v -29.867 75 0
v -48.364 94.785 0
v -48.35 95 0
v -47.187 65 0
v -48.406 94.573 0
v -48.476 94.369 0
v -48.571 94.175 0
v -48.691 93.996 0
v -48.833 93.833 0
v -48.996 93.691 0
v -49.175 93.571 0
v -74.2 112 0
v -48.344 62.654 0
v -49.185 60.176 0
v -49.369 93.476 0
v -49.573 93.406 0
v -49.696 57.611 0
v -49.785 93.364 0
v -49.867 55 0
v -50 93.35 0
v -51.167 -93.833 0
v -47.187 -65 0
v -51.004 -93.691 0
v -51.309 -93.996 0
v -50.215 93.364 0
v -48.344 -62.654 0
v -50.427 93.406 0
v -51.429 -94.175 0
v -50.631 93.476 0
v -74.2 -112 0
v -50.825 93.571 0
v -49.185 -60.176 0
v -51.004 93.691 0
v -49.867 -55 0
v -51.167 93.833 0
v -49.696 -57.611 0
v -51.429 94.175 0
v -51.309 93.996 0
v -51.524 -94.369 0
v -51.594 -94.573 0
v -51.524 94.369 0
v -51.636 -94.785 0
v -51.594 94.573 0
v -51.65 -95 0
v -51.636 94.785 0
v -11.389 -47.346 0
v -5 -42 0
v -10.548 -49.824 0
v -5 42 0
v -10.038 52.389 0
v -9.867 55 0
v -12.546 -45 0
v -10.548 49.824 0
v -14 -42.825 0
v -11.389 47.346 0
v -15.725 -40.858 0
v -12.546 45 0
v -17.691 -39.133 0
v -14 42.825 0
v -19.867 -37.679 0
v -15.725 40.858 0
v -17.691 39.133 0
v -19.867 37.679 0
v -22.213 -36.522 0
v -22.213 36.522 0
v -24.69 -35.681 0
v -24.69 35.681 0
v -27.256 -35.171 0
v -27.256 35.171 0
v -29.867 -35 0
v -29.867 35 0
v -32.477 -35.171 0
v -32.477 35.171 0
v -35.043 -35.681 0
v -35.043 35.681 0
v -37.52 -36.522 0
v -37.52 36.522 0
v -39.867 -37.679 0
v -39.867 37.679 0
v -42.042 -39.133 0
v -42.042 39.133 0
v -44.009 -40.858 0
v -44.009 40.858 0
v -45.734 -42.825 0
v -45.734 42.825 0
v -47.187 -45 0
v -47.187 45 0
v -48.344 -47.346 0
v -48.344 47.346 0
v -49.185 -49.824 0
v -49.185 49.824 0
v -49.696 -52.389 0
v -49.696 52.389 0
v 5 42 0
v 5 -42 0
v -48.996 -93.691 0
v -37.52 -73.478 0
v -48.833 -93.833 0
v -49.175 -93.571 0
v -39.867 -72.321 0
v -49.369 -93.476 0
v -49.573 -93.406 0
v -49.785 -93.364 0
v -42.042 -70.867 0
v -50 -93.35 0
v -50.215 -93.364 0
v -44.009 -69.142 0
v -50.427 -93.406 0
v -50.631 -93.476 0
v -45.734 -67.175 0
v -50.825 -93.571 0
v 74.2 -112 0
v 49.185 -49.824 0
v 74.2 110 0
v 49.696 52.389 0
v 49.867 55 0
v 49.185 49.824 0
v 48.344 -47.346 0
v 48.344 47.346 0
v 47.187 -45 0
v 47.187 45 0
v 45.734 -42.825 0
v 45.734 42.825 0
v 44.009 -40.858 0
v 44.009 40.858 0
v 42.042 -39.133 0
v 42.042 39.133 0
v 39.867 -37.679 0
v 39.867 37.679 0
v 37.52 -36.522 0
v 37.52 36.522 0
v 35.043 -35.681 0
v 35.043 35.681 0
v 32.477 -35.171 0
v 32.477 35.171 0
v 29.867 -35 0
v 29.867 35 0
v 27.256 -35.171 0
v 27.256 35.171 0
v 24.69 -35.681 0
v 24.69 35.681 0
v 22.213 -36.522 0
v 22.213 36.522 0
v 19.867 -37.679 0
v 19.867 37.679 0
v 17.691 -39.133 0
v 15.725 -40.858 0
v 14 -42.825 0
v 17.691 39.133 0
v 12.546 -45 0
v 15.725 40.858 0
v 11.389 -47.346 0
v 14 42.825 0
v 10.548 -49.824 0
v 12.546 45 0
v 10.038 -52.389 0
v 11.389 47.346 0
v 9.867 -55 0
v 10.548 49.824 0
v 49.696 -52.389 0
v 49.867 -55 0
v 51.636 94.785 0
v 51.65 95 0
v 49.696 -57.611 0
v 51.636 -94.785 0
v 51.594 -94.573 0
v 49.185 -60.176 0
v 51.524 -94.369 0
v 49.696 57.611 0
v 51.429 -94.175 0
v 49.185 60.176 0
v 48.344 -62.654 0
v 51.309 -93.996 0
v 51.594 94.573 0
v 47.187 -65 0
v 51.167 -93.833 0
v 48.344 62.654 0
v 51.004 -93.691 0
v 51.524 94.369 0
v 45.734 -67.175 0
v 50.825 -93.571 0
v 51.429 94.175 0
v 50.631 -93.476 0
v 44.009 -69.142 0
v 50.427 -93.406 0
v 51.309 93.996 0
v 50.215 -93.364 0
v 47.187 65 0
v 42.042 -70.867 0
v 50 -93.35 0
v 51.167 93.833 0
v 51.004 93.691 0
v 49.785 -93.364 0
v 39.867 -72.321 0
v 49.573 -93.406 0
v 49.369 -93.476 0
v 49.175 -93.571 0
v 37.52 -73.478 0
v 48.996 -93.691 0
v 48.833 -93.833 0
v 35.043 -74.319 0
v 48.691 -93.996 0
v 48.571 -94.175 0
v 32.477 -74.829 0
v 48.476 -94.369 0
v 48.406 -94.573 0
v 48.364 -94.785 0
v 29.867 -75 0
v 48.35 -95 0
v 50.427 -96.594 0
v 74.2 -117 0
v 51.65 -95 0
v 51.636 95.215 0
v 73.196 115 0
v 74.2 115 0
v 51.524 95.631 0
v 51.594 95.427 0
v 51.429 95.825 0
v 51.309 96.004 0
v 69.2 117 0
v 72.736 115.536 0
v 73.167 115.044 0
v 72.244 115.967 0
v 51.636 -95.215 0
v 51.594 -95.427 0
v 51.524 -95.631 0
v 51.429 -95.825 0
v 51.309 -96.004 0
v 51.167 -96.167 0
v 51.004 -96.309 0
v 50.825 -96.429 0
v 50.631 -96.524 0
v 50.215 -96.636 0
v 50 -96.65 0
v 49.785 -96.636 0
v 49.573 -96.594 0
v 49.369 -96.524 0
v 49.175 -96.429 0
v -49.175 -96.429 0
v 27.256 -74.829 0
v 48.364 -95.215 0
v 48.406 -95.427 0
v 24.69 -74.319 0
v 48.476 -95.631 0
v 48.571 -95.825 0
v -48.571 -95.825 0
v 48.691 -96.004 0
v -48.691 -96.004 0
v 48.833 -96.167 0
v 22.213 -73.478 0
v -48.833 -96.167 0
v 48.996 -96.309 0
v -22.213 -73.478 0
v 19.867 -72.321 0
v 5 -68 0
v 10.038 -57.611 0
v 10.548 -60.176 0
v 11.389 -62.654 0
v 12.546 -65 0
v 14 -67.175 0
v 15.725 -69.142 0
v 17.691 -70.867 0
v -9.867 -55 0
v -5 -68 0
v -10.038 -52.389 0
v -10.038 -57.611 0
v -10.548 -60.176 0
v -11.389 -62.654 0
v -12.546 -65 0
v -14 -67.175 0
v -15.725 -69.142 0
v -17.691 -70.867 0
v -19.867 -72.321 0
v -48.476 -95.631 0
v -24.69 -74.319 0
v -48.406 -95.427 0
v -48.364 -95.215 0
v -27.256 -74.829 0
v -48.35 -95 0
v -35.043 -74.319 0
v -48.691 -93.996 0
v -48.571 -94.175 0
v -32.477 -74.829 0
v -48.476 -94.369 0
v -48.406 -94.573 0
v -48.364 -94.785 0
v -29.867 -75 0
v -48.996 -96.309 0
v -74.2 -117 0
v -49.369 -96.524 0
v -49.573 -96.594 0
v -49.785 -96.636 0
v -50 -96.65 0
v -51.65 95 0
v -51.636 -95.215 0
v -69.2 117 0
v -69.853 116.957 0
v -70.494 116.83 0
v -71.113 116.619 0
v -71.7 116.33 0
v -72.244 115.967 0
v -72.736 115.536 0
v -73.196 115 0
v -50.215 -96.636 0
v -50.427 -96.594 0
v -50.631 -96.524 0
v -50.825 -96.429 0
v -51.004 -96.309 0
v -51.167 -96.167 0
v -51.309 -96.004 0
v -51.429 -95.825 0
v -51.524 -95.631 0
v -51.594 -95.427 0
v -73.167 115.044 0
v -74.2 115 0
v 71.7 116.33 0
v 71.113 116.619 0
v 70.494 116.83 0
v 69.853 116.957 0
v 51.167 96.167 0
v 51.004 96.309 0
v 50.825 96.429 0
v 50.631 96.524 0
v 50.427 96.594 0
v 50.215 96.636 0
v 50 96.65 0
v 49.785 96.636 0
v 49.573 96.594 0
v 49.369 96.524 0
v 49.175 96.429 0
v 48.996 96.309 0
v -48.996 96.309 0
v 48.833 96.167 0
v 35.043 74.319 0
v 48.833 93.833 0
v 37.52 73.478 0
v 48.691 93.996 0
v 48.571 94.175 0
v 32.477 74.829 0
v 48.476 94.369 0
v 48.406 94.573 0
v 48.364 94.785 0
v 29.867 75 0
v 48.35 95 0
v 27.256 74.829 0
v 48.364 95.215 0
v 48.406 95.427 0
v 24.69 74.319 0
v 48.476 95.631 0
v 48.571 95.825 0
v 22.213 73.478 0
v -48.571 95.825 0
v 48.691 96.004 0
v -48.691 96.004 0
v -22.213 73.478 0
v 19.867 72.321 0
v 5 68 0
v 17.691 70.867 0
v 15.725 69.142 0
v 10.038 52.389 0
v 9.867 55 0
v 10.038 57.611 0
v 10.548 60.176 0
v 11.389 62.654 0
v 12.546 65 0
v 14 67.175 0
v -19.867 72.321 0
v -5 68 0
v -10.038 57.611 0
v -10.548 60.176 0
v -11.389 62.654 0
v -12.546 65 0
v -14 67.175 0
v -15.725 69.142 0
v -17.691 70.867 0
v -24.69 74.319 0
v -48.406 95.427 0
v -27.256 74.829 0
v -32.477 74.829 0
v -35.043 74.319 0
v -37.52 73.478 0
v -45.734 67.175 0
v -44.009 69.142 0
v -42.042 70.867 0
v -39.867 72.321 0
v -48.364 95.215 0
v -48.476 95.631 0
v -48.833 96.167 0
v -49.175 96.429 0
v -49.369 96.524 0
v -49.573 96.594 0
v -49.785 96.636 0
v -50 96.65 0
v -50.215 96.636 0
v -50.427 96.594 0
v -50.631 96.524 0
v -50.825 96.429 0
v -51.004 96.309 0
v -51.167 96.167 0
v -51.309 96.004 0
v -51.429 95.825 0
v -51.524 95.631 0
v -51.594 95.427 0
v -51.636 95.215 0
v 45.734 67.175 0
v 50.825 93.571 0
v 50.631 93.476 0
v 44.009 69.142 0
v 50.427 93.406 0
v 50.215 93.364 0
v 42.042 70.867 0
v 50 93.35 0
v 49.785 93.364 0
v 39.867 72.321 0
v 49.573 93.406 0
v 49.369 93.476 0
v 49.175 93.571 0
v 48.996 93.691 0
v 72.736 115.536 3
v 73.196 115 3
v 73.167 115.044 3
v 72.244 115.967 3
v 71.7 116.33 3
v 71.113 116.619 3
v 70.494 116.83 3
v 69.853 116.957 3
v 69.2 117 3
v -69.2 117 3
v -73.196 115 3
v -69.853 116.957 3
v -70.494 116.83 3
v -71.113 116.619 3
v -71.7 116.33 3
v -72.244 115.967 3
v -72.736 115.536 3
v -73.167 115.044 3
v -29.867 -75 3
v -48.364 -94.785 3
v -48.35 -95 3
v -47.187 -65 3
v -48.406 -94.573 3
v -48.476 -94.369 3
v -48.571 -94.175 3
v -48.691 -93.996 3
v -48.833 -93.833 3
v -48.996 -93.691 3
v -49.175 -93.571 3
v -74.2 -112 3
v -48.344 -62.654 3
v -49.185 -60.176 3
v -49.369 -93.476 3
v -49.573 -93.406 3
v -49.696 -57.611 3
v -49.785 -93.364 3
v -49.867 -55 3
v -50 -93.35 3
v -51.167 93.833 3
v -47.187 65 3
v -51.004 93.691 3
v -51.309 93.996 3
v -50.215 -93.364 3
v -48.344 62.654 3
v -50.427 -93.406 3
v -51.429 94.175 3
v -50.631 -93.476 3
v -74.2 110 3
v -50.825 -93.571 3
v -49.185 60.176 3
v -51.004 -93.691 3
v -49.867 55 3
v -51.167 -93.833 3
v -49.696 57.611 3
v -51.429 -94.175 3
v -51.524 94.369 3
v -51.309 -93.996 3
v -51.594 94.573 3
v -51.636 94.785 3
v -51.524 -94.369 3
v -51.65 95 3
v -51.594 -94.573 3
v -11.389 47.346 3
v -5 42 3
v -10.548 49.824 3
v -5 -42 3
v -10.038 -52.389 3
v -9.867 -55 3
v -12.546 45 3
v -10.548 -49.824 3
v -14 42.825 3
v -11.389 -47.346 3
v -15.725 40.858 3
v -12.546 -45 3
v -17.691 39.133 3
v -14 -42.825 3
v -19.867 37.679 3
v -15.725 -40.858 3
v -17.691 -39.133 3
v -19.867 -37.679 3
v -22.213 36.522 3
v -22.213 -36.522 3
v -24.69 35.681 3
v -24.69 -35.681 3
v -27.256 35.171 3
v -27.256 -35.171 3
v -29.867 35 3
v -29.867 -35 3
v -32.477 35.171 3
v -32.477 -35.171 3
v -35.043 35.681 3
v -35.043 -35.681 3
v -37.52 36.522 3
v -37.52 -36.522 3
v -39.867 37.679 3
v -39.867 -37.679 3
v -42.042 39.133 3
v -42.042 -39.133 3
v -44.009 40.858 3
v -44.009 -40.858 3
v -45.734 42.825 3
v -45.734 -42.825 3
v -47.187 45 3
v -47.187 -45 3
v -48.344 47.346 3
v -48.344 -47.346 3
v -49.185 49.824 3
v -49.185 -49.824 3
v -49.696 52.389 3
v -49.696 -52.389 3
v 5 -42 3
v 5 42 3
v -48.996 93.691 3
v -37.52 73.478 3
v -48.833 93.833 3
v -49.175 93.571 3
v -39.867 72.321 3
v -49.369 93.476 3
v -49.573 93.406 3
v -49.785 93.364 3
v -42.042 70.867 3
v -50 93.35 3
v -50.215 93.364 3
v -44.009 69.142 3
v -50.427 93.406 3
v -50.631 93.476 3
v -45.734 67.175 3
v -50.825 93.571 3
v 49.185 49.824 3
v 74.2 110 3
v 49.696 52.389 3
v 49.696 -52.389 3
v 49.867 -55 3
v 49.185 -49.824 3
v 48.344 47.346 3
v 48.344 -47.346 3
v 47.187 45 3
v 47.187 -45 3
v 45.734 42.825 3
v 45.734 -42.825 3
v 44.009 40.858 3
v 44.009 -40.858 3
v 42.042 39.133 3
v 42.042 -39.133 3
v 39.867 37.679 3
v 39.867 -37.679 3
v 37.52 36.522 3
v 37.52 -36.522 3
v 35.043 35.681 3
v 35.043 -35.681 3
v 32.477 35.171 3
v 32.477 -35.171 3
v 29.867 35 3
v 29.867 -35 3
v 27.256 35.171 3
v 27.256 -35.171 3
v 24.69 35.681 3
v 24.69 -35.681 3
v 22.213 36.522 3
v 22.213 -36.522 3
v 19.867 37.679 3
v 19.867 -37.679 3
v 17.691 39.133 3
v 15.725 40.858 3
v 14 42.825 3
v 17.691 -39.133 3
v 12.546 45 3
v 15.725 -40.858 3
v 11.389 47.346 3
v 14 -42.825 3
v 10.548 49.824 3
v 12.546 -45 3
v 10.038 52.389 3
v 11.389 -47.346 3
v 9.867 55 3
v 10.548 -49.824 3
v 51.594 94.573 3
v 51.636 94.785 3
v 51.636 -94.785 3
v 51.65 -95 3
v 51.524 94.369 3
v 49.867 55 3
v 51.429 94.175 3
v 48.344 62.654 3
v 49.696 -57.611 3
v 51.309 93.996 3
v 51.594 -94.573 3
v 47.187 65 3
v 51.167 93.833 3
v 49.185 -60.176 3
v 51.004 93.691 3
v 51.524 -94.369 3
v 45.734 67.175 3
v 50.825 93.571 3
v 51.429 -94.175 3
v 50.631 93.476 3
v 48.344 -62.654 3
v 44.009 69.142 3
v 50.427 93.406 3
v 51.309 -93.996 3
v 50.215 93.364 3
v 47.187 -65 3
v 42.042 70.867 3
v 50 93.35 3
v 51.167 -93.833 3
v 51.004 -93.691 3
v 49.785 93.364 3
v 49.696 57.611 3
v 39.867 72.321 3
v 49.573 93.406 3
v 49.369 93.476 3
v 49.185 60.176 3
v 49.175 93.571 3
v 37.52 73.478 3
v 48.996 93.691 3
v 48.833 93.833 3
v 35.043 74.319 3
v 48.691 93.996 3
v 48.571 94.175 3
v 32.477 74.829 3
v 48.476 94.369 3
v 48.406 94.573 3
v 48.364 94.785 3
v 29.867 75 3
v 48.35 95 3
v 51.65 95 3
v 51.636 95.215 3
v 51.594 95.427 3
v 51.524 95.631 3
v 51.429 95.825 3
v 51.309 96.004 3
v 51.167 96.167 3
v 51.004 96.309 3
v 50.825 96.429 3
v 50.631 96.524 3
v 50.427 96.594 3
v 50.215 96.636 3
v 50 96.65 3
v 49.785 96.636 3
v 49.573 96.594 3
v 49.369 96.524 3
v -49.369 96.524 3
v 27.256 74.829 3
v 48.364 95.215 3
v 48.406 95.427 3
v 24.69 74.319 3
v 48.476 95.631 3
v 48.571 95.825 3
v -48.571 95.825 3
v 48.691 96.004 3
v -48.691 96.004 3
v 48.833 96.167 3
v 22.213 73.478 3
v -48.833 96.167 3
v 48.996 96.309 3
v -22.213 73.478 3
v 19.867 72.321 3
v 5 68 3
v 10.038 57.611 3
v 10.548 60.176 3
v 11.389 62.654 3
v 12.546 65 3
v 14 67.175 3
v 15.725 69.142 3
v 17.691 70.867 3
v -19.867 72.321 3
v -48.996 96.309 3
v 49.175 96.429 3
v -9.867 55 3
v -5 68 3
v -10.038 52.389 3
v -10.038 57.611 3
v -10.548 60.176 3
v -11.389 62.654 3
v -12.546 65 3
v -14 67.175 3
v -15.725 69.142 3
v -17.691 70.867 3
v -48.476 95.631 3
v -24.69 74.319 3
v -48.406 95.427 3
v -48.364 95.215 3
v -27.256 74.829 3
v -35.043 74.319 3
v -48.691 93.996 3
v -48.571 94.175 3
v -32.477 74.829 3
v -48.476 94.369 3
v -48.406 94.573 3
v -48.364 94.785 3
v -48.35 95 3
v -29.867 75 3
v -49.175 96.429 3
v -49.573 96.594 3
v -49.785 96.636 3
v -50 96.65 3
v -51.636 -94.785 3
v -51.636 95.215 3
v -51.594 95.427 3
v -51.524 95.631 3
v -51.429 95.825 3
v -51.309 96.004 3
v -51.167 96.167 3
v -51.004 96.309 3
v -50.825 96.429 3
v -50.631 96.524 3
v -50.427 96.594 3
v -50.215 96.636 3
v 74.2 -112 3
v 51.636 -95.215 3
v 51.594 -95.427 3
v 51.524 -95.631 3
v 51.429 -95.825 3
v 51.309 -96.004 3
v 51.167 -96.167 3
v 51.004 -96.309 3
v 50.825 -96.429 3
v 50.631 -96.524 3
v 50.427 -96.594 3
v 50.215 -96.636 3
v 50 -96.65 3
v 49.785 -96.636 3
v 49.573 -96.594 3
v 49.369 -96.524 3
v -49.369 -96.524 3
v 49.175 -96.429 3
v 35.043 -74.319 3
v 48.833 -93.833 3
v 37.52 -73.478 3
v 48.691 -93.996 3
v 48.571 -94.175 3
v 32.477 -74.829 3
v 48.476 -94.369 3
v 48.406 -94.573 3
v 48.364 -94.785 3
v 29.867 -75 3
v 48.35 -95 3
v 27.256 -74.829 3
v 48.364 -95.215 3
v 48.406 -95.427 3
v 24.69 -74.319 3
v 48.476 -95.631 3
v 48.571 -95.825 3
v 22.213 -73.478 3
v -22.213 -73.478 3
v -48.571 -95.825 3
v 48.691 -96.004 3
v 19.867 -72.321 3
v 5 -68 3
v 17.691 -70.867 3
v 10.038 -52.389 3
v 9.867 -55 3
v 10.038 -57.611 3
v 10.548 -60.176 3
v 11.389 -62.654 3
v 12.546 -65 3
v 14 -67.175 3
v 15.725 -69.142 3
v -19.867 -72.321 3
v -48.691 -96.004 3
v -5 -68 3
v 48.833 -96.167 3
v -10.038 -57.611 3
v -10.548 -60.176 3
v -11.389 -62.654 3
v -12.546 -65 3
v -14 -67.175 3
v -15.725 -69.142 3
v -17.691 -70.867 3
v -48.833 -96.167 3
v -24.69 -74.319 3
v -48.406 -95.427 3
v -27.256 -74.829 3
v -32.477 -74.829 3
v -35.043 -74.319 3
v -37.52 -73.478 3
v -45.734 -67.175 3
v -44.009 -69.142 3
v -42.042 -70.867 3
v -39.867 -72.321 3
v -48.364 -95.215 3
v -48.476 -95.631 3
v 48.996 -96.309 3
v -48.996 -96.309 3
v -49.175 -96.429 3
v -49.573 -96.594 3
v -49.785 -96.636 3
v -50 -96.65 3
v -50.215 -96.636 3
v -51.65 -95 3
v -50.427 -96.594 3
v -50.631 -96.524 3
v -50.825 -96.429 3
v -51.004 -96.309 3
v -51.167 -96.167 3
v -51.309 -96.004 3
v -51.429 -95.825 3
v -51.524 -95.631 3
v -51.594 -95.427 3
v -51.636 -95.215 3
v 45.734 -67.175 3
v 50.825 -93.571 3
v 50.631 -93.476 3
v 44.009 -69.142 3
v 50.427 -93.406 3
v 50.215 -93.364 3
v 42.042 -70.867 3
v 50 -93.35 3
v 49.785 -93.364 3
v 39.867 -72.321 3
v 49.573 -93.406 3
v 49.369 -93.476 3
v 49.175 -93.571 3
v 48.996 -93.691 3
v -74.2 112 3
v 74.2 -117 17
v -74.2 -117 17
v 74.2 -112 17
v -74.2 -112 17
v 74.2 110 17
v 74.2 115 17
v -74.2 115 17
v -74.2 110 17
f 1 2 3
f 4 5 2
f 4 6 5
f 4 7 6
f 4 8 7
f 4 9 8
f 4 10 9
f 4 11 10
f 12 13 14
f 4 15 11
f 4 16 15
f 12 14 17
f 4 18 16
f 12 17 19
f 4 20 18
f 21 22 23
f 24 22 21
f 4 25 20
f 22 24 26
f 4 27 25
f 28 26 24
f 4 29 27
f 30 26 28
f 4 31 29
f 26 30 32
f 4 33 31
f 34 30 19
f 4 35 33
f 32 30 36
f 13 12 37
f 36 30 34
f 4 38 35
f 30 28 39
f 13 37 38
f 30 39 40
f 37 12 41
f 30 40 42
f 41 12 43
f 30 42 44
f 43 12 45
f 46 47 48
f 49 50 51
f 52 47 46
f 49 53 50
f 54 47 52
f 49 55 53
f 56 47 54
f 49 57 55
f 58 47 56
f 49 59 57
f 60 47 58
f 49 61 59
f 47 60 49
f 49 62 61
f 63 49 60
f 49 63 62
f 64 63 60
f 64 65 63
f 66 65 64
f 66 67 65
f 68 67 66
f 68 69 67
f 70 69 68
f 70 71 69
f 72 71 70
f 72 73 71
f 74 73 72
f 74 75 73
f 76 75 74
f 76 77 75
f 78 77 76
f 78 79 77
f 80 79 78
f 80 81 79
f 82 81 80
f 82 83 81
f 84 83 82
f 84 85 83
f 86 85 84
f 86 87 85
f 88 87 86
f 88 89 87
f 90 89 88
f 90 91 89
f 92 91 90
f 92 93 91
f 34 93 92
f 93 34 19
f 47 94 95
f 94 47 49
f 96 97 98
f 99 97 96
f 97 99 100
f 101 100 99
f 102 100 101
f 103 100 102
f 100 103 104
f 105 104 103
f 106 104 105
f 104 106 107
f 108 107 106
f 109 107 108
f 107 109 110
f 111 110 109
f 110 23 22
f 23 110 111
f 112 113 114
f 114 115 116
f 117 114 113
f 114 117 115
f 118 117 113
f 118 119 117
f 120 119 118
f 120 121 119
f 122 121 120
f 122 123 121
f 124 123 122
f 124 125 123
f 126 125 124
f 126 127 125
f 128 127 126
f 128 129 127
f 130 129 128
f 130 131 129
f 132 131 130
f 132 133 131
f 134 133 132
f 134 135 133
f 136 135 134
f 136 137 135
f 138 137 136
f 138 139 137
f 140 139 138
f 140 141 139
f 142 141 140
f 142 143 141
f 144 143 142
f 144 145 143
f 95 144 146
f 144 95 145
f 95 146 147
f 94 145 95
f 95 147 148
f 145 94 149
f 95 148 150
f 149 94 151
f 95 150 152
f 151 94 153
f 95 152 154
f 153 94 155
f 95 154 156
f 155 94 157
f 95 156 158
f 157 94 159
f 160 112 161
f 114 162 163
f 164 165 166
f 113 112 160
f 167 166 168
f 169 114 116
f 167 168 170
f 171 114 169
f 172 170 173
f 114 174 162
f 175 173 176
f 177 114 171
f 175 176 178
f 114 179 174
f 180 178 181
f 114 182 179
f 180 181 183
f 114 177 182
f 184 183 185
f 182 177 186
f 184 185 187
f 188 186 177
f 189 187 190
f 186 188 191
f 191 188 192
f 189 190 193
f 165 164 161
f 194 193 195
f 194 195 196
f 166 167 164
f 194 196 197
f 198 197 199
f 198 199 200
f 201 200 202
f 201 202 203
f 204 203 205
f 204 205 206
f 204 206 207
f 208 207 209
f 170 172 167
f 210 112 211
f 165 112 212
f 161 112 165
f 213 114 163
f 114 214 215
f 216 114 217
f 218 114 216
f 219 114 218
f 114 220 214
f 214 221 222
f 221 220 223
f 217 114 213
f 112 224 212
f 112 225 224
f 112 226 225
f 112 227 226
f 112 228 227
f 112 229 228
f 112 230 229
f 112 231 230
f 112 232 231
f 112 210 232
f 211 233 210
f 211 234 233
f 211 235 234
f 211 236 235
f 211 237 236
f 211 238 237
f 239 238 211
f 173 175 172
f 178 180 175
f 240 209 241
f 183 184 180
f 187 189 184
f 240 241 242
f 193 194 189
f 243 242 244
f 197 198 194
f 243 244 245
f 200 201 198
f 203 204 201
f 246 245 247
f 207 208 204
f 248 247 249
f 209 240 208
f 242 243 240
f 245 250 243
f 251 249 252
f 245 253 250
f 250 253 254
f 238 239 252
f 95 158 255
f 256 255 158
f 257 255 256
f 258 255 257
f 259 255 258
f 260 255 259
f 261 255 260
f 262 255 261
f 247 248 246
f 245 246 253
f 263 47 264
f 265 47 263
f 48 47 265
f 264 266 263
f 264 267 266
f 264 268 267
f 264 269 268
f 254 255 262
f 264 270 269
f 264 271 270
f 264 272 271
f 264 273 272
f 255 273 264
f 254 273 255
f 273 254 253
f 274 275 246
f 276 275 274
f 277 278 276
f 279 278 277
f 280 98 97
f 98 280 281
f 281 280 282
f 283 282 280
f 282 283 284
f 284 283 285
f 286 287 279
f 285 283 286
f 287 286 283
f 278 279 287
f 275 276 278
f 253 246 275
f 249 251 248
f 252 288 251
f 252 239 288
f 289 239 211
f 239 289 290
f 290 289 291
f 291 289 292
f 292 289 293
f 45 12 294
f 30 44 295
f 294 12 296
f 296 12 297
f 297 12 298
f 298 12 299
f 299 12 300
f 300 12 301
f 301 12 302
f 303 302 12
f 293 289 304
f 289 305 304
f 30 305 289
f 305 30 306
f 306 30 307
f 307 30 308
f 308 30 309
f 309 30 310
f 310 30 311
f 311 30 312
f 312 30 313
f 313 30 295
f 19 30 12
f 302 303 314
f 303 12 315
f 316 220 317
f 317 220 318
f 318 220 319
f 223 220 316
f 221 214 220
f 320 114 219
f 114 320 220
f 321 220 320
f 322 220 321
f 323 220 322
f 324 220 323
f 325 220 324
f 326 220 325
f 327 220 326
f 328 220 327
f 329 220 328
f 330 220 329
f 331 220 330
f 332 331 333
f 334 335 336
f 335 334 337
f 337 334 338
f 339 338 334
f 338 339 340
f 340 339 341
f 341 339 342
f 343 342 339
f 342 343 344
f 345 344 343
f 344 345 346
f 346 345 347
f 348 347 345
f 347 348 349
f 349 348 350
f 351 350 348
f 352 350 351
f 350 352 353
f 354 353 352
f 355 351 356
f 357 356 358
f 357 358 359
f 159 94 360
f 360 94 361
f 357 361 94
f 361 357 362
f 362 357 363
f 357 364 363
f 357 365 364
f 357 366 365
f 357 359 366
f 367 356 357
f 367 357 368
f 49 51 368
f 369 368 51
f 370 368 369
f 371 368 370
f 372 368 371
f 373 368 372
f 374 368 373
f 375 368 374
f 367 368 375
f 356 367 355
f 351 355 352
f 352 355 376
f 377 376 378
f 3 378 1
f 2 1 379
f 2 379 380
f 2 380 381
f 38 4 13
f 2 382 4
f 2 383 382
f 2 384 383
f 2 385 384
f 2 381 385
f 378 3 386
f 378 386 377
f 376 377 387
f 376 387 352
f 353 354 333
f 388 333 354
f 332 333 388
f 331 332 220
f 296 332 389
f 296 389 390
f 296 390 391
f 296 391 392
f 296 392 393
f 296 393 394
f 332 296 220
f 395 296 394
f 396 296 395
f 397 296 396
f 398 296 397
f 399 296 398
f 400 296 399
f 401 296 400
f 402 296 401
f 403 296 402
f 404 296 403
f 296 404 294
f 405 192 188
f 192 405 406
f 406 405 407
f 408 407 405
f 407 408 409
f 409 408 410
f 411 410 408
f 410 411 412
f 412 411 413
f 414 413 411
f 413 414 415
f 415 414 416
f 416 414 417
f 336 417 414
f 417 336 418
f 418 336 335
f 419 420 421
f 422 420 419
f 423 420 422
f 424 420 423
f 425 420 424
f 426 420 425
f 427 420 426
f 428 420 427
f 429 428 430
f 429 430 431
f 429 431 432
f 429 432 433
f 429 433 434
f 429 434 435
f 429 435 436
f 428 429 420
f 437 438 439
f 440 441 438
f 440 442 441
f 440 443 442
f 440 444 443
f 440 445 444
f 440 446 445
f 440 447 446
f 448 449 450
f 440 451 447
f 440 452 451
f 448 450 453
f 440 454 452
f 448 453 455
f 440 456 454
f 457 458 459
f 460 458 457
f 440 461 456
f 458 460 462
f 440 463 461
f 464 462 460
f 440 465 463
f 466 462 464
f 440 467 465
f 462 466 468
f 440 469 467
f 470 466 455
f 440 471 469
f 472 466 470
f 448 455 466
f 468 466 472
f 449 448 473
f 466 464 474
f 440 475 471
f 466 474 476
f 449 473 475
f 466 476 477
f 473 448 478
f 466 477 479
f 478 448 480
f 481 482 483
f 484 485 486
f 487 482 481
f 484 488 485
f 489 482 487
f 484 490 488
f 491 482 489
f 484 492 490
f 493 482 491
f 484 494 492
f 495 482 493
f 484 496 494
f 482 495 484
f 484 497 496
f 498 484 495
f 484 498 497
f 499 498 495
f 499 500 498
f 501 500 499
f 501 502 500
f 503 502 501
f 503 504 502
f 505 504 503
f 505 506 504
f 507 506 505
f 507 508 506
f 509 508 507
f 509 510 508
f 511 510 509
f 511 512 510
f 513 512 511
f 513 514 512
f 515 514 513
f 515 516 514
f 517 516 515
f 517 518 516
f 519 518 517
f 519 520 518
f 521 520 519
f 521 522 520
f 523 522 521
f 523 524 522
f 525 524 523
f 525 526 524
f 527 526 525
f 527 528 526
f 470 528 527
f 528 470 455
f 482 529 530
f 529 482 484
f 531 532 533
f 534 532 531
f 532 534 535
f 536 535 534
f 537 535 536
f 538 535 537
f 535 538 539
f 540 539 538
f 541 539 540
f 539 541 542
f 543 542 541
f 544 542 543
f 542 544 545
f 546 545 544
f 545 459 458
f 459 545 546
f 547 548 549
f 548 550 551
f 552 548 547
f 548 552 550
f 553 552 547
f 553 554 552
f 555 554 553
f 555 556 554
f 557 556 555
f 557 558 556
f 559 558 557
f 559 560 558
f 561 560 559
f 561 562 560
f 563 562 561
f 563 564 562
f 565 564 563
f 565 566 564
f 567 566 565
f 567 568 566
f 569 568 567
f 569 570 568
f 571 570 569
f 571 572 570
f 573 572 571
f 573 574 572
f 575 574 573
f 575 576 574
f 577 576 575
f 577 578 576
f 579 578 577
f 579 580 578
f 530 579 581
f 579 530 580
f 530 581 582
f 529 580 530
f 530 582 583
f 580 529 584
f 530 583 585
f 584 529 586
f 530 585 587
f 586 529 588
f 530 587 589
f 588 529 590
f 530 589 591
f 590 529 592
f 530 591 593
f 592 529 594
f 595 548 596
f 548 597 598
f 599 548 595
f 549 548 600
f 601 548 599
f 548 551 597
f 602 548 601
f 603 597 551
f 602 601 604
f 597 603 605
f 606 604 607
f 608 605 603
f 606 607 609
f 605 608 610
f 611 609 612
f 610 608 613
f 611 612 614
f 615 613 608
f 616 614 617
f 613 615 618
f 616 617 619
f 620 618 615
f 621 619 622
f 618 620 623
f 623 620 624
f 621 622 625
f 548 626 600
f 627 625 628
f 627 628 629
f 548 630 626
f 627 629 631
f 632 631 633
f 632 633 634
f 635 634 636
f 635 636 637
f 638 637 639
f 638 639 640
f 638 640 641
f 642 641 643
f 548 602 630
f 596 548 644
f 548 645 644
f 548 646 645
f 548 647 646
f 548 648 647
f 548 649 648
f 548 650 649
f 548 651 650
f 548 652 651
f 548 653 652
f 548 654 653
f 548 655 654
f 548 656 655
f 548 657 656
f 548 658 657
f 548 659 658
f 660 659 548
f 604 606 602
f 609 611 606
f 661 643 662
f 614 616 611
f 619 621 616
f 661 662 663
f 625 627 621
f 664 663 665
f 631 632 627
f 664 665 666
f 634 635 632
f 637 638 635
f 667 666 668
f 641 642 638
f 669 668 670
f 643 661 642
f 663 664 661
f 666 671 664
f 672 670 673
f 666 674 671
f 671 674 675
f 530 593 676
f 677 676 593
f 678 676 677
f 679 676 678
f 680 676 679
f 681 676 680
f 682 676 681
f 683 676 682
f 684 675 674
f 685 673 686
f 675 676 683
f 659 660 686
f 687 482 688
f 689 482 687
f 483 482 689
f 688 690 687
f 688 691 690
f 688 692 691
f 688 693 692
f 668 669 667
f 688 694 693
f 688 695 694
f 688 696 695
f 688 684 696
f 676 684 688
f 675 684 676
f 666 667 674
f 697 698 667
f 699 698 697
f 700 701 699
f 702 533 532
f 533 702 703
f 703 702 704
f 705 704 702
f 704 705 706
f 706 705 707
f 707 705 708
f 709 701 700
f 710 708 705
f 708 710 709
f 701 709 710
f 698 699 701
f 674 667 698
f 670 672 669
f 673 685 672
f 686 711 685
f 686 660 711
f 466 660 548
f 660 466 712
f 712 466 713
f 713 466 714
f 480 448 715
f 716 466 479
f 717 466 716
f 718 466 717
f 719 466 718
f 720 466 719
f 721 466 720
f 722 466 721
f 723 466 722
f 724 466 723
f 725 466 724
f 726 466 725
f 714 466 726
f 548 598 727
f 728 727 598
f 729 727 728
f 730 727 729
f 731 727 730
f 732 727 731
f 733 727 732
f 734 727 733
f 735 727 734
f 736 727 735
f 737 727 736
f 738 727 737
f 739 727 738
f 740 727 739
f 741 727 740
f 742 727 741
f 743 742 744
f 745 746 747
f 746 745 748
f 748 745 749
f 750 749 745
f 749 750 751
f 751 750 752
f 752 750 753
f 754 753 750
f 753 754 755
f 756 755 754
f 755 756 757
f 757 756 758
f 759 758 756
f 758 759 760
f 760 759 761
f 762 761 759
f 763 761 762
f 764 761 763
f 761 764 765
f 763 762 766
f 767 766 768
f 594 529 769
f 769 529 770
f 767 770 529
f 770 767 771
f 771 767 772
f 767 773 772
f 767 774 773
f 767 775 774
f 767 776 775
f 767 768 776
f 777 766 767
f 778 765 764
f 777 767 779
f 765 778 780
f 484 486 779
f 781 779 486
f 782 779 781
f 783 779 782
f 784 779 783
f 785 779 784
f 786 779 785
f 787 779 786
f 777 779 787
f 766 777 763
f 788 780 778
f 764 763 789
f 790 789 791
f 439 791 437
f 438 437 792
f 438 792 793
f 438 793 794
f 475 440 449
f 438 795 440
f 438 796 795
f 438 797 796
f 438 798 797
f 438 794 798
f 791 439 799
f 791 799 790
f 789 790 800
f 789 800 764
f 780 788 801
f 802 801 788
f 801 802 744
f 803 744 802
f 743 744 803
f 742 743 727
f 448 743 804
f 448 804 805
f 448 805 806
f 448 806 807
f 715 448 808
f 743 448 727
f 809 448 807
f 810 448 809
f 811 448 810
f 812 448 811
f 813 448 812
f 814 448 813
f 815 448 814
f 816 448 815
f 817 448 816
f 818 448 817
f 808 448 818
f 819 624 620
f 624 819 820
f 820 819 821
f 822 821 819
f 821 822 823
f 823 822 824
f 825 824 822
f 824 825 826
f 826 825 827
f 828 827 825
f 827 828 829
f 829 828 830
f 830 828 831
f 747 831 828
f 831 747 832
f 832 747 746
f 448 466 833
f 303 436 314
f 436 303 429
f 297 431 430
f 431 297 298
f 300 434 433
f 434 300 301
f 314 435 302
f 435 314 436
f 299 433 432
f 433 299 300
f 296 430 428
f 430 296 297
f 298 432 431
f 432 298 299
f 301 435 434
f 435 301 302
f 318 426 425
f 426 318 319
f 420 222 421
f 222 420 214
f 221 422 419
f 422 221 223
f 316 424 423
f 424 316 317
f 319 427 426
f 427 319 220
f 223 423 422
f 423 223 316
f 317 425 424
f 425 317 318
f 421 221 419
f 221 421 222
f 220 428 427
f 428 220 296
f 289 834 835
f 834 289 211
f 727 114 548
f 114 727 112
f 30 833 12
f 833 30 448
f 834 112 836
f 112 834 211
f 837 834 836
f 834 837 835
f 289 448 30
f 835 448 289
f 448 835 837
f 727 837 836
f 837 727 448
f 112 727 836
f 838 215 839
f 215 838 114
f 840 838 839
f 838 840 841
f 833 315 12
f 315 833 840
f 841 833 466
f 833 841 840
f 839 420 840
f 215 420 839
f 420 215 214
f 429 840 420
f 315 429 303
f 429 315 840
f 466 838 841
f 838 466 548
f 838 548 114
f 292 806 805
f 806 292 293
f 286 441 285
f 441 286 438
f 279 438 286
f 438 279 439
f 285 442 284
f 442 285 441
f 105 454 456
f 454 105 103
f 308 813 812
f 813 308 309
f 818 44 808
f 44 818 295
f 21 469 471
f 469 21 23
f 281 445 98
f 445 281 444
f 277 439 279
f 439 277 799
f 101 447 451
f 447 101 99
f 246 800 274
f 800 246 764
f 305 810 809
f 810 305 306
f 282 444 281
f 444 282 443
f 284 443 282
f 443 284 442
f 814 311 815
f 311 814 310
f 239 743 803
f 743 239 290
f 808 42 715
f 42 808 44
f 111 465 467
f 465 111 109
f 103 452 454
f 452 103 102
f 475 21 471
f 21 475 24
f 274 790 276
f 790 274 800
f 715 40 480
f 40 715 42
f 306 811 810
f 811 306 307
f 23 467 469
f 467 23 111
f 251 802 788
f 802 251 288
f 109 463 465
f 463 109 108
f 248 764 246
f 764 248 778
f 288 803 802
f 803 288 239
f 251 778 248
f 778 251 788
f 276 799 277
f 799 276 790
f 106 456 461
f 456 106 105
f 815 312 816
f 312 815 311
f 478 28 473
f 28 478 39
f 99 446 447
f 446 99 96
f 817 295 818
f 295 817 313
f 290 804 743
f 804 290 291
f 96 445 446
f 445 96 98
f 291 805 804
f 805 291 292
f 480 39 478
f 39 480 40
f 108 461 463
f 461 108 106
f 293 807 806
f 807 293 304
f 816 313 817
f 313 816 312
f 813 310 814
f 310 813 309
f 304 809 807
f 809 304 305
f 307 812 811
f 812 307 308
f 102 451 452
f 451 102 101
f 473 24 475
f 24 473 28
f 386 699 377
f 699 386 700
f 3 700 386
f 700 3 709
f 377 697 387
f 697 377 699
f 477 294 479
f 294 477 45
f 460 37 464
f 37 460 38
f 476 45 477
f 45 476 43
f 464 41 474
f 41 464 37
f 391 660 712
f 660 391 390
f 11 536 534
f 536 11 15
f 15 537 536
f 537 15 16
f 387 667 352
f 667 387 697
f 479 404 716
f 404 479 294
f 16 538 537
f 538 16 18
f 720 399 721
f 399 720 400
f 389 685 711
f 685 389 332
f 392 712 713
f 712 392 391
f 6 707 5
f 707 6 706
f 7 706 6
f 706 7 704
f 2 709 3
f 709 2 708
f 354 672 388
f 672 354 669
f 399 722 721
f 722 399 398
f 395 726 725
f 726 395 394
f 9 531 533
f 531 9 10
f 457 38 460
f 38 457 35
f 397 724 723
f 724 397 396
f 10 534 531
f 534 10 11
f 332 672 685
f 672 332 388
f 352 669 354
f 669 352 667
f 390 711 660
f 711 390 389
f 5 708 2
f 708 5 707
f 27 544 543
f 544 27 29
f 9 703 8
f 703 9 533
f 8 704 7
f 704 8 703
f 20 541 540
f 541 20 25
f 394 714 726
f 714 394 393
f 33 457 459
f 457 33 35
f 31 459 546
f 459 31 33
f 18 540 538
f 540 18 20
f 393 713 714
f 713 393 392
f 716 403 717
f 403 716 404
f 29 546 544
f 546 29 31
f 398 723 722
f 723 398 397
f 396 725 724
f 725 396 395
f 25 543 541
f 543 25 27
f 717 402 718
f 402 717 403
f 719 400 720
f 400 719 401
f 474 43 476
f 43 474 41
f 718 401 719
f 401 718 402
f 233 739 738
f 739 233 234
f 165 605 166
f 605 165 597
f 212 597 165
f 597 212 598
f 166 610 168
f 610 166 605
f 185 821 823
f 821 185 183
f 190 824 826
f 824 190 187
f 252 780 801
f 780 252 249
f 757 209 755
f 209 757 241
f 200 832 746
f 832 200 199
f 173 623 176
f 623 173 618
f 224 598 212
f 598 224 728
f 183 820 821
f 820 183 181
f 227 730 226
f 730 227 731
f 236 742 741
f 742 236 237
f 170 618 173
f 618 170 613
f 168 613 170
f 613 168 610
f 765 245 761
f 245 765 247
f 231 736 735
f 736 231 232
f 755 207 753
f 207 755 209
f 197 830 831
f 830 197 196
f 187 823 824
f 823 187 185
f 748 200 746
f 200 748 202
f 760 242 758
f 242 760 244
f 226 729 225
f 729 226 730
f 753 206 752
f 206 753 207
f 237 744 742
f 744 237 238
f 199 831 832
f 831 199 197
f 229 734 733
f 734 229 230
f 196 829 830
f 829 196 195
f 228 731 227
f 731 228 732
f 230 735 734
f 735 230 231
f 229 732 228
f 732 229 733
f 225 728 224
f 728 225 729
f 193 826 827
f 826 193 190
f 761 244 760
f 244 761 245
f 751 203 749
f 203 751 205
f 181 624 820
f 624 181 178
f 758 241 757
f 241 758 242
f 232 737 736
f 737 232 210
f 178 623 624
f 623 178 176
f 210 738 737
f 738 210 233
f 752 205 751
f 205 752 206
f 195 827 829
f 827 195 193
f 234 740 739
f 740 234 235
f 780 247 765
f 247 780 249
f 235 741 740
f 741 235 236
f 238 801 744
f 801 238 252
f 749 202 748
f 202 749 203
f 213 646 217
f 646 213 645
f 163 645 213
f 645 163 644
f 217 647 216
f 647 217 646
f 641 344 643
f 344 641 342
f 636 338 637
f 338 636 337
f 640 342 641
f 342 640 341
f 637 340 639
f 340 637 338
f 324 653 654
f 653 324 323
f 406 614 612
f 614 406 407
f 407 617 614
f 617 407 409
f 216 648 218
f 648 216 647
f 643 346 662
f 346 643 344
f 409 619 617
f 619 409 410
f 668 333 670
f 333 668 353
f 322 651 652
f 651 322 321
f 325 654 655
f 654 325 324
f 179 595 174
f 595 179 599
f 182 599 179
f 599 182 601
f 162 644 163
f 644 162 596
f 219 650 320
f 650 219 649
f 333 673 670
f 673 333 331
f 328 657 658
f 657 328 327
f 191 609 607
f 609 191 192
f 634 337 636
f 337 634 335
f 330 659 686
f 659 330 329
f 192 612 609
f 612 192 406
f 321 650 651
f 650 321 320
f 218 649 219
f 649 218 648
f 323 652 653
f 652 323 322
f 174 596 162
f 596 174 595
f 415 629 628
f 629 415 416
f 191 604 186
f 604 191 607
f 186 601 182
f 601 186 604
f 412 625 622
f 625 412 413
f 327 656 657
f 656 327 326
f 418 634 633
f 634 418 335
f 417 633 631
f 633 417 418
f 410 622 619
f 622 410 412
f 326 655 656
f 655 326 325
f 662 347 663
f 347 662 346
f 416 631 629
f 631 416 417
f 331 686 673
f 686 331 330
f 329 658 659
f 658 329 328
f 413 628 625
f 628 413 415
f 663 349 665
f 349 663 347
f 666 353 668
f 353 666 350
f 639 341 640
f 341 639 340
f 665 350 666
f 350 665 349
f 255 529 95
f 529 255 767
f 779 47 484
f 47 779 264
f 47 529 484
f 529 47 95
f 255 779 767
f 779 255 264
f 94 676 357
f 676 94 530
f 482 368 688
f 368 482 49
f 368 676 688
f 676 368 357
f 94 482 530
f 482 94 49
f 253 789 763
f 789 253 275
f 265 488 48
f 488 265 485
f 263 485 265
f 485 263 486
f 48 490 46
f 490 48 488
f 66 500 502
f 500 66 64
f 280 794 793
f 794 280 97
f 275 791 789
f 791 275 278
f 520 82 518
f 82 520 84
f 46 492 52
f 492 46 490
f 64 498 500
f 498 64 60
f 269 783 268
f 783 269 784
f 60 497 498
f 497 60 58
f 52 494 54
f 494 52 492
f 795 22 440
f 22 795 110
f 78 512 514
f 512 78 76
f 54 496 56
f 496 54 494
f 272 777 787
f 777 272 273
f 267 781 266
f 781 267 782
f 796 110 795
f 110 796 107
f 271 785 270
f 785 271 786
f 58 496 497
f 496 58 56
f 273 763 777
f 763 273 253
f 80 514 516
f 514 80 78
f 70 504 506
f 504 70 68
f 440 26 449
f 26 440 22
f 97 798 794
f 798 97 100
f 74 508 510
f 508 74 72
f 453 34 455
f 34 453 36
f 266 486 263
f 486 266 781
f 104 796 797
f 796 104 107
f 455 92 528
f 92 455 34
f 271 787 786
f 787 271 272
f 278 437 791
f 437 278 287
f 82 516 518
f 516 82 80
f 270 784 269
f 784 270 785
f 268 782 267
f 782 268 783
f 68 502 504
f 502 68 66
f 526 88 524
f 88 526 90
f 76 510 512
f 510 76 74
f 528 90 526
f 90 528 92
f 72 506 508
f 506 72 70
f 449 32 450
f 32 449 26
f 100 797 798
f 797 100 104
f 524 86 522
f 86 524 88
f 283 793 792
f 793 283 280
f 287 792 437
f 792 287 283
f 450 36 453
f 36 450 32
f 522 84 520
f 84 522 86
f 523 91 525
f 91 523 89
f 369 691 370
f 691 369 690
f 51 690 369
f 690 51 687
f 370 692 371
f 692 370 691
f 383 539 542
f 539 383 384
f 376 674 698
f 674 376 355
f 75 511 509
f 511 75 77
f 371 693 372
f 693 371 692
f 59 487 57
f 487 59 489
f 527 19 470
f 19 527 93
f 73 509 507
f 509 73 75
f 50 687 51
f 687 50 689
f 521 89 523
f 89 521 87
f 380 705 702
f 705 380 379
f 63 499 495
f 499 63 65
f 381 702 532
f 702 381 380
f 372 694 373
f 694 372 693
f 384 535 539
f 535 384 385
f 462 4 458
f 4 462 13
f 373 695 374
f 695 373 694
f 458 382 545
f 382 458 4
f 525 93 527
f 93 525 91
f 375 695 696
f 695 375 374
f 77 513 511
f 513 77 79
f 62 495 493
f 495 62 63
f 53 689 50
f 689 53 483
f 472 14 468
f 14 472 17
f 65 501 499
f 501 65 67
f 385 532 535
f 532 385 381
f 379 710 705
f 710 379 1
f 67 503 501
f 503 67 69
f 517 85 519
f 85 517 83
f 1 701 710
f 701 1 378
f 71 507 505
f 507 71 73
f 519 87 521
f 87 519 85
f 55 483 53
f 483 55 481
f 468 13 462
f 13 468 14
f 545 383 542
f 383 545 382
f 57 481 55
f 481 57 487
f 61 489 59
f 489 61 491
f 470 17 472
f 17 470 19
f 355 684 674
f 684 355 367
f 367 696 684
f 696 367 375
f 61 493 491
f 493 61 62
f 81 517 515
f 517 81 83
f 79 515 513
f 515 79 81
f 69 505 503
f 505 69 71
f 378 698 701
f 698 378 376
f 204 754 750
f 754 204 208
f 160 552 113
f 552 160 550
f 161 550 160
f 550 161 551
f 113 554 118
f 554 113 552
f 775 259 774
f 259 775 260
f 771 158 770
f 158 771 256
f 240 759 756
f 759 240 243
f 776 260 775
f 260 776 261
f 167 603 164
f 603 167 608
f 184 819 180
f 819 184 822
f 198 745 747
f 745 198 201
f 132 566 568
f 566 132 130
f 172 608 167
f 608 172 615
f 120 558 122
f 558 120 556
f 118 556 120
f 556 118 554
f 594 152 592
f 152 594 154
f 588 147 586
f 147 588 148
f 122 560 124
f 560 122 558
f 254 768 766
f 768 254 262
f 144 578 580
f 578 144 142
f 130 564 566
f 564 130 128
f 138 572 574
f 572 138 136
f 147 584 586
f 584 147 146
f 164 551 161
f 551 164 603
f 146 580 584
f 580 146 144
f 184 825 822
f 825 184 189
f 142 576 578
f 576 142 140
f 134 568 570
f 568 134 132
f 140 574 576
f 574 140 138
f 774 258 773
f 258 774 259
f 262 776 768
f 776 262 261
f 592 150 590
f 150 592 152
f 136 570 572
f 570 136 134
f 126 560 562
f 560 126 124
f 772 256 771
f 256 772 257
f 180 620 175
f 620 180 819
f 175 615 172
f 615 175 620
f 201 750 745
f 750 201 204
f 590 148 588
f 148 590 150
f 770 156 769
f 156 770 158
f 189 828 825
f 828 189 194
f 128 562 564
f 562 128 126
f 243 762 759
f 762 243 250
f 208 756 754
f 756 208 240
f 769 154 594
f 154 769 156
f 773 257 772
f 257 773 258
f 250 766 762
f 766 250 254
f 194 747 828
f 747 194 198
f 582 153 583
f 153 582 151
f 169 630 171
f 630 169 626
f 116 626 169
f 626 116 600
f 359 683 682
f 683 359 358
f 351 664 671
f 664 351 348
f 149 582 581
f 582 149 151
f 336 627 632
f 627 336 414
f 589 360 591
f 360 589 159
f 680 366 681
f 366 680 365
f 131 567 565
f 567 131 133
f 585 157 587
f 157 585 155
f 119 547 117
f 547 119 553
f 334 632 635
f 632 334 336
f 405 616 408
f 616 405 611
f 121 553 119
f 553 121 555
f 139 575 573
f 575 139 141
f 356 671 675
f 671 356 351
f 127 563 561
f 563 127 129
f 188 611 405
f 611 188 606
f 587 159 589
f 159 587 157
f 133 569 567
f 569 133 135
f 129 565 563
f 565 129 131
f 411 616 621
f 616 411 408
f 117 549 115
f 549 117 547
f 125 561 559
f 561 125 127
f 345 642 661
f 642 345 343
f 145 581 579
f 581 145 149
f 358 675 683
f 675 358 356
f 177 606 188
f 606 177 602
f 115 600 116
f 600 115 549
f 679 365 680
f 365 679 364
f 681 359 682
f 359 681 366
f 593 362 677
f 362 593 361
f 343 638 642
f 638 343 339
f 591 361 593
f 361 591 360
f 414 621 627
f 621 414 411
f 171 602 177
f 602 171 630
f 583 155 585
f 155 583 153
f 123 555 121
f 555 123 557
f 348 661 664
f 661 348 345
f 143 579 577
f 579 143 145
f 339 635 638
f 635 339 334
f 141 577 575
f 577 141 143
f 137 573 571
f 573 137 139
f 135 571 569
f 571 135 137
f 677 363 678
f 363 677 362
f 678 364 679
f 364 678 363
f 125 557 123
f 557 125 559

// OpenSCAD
// file: ../common/ds_lib.scad
// DronSwarm · librería común de piezas del frame (S07-S08). Unidades: mm.
//
// Reglas (ADR-003): sin hull()/minkowski()/offset() — FreeCAD los convierte en malla y el STEP deja de ser un
// sólido válido. Las formas redondeadas se arman con uniones de cubos y cilindros. El importador CSG de FreeCAD
// también falla con booleanas 2D y con varios operandos agrupados bajo una sola transformación: cada grupo de
// agujeros debe ser hijo directo del difference(), con su propio translate.
//
// Interfaz de motor DronSwarm (DMI, ADR-011): placa con 4 ranuras radiales a 90°, de modo que el mismo soporte
// acepta varios patrones comerciales y, más adelante, el motor propio (S17+) se diseña para caer en el mismo rango.
//   DMI-S: 4×M3, círculo de tornillos Ø16-Ø25 (motores 28xx-41xx, ≤ 600 W)
//   DMI-L: 4×M4, círculo de tornillos Ø30-Ø42 (motores 50xx-70xx, ≤ 2 kW)

$fn = 48;

M3 = 3.3; M3_HEAD = 6.0; M3_NUT = 6.4;     // pasante, cabeza, tuerca (entre caras + juego)
M4 = 4.4; M4_HEAD = 7.5;
M5 = 5.4;

function dmi_bolt(iface) = iface == "L" ? M4 : M3;
function dmi_r(iface) = iface == "L" ? [15, 21] : [8, 12.5];   // radio mínimo y máximo de las ranuras
function dmi_plate_d(iface) = iface == "L" ? 56 : 36;
function dmi_center(iface) = iface == "L" ? 16 : 10;            // eje, seguro y paso de cables

// Rectángulo con esquinas redondeadas (2D) y su extrusión
module rrect2d(size, r) {
    r2 = min(r, size[0] / 2 - 0.01, size[1] / 2 - 0.01);
    union() {
        translate([r2, 0]) square([size[0] - 2 * r2, size[1]]);
        translate([0, r2]) square([size[0], size[1] - 2 * r2]);
        for (x = [r2, size[0] - r2], y = [r2, size[1] - r2]) translate([x, y]) circle(r = r2);
    }
}
// Caja redondeada con primitivas 3D (sin booleanas 2D: el importador CSG de FreeCAD falla con ellas)
module rbox(size, r) {
    r2 = min(r, size[0] / 2 - 0.01, size[1] / 2 - 0.01);
    union() {
        translate([r2, 0, 0]) cube([size[0] - 2 * r2, size[1], size[2]]);
        translate([0, r2, 0]) cube([size[0], size[1] - 2 * r2, size[2]]);
        for (x = [r2, size[0] - r2], y = [r2, size[1] - r2]) translate([x, y, 0]) cylinder(r = r2, h = size[2]);
    }
}
module crbox(size, r) { translate([-size[0] / 2, -size[1] / 2, 0]) rbox(size, r); }   // centrado en x/y

// Ranura (2D) entre dos puntos sobre el eje x
module slot2d(r0, r1, w) {
    union() {
        translate([r0, -w / 2]) square([r1 - r0, w]);
        translate([r0, 0]) circle(d = w);
        translate([r1, 0]) circle(d = w);
    }
}

// Agujeros de la interfaz de motor (para restar de una placa de espesor t)
module slot3d(r0, r1, w, h) {
    union() {
        translate([r0, -w / 2, 0]) cube([r1 - r0, w, h]);
        translate([r0, 0, 0]) cylinder(d = w, h = h);
        translate([r1, 0, 0]) cylinder(d = w, h = h);
    }
}
module dmi_holes(iface, t) {
    r = dmi_r(iface);
    translate([0, 0, -1]) union() {
        cylinder(d = dmi_center(iface), h = t + 2);
        for (a = [45, 135, 225, 315]) rotate(a) slot3d(r[0], r[1], dmi_bolt(iface), t + 2);
    }
}

// Soporte de motor en la punta del brazo: manguito sobre el tubo + placa DMI arriba
//   el tubo entra por -x; la placa queda centrada en el eje del motor (origen), cara superior en z = 0
module motor_mount(tube_d, iface = "S", sleeve = 34, wall = 3.5) {
    od = tube_d + 2 * wall;
    pd = dmi_plate_d(iface);
    pt = iface == "L" ? 6 : 4;
    zc = -pt - tube_d / 2 - 1;                 // eje del tubo bajo la placa
    difference() {
        union() {
            translate([0, 0, -pt]) cylinder(d = pd, h = pt);                         // placa DMI
            translate([-sleeve - pd / 2 + 6, 0, zc]) rotate([0, 90, 0])
                cylinder(d = od, h = sleeve + pd / 2 - 6 + 4);                       // manguito
            translate([-sleeve - pd / 2 + 6, -od / 2, zc]) cube([sleeve + pd / 2 - 2, od, -zc - pt + 0.01]);  // alma
            translate([-sleeve - pd / 2 + 6, -5, zc - od / 2 - 7]) cube([sleeve, 10, 8]);   // oreja de apriete
        }
        dmi_holes(iface, pt + 0.02, $fn = 32);
        translate([-sleeve - pd / 2 + 5, 0, zc]) rotate([0, 90, 0]) cylinder(d = tube_d + 0.3, h = sleeve + pd / 2 - 3); // tubo
        translate([-sleeve - pd / 2 + 4, -1, zc - od / 2 - 8]) cube([sleeve + 1, 2, od / 2 + 6]);   // ranura de apriete
        for (x = [0.3, 0.75]) translate([-sleeve - pd / 2 + 6 + x * sleeve, 0, zc - od / 2 - 3])
            rotate([90, 0, 0]) cylinder(d = M3, h = 30, center = true);                // tornillos de apriete
        translate([-pd / 2 - 2, 0, zc]) rotate([0, 90, 0]) cylinder(d = 7, h = pd);   // salida de cables del tubo
    }
}

// Bloque de brazo entre las dos placas centrales (impreso PA12-CF): sujeta el tubo y separa las placas.
//   el tubo sale por +x desde el origen; el bloque ocupa x ∈ [-len, 0], altura = gap
module arm_block(tube_d, gap, len = 40, width = 0, bolt = M3) {
    w = width > 0 ? width : tube_d + 14;
    difference() {
        translate([-len, -w / 2, 0]) rbox([len, w, gap], 2);
        translate([-len - 1, 0, gap / 2]) rotate([0, 90, 0]) cylinder(d = tube_d + 0.2, h = len + 2);   // tubo
        translate([-len - 1, -0.75, gap / 2]) cube([len + 2, 1.5, gap / 2 + 1]);                        // ranura de apriete
        for (p = arm_block_bolts(tube_d, len, w)) translate([p[0], p[1], -1]) cylinder(d = bolt, h = gap + 2);
        translate([-len * 0.5, 0, gap * 0.78]) rotate([90, 0, 0]) cylinder(d = M3, h = w + 2, center = true);  // apriete
    }
}
function arm_block_bolts(tube_d, len, w) =
    [for (x = [-len + 6, -6], y = [-(w / 2 - 3.6), w / 2 - 3.6]) [x, y]];

// Patrón de controladora de vuelo (agujeros M3 en cuadrado)
module fc_holes(pattern, t) {
    for (x = [-1, 1], y = [-1, 1]) translate([x * pattern / 2, y * pattern / 2, -1]) cylinder(d = M3, h = t + 2);
}
// file: ds_d_params.scad
// DS-D · parámetros generados por tools/cad/gen_cad_params.py el 2026-10-19
// desde engineering/data/results (spec v1). No editar a mano: regenerar. Unidades: mm, kg.

vehicle = "DS-D";
rotors = 6;
wheelbase = 1453;
arm_radius = 726.5;
prop_d = 660.4;
tube_od = 22;
tube_wall = 1.5;
arm_len = 545;
plate_d = 363.2;
plate_t = 3;
plate_gap = 28;
motor_iface = "L";
battery_dims = [220, 134.4, 76.2];
battery = "12S5P P42A";
leg_h = 420;
fold_arms = true;
mtow_kg = 15.61;
motor_mass_kg = 0.345;
fc_pattern = 30.5;
payload_box = [300, 240, 220];
payload_kg = 5;
// file: ds_d_frame.scad
// DS-D · geometría compartida del frame: posiciones derivadas de los parámetros (spec v1). Unidades: mm.
// Ejes: x adelante, y izquierda, z arriba. z = 0 es la cara superior de la placa inferior.
// Hexa con brazos desmontables (bloques con levas entre las placas, ADR-012), batería y carcasa arriba,
// mecanismo de liberación de la carga al centro abajo, tren de esquíes.

include <ds_d_params.scad>
use <../common/ds_lib.scad>
include <../common/ds_lib.scad>

arm_angles = [0, 60, 120, 180, 240, 300];      // igual que el SDF/PX4 (rotor 0 adelante)
// Brazos desmontables (ADR-012): el tubo entra en un bloque impreso entre las placas y se fija con 2 levas de
// apriete rápido; los cables del motor tienen un conector en el bloque. Se monta/desmonta sin herramientas.
block_len = 60;
block_w = tube_od + 20;
r_block_out = plate_d / 2 - 3;                  // cara exterior del bloque
tube_insert = 54;                               // el tubo entra hasta un tope interior
tube_z = plate_gap / 2;
tube_start = r_block_out - tube_insert;
tube_len = arm_radius - tube_start - 6;
mm_sleeve = 30;

// Arriba: batería transversal atrás y carcasa adelante. Abajo: liberación al centro, FPV adelante
battery_pos = [-60, 0];
housing_size = [130, 110, 62];
housing_pos = [90, 0];
housing_flange = 10;
housing_bolts = [for (x = [-1, 0, 1], y = [-1, 1]) [housing_pos[0] + x * (housing_size[0] / 2 + 6), y * (housing_size[1] / 2 + 6)]];   // fuera del canal de la junta
battery_tray_bolts = [for (x = [-1, 1], y = [-1, 1]) [battery_pos[0] + x * 50, y * 95]];
release_bolts = [for (x = [-1, 1], y = [-1, 1]) [x * 35, y * 20]];
cable_gland_pos = [housing_pos[0] - housing_size[0] / 2 + 20, 0];
fpv_pos = [plate_d / 2 - 30, 0];

// Tren de esquíes: 4 patas inclinadas desde la placa inferior hasta dos esquíes longitudinales (base ancha)
leg_x = 100;                                    // patas en x = ±leg_x
leg_y_top = 110;                                // arriba, bajo la placa
skid_y = 220;                                   // esquíes en y = ±skid_y
skid_len = 560;
gear_tube = 16;                                 // tubos Ø16×1
gear_wall = 1.0;
ground_z = -leg_h;
skid_z = ground_z + gear_tube / 2 + 6;          // eje del esquí (sobre su zapata de TPU de 6 mm)
gear_mount_h = 30;                              // soporte impreso bajo la placa
// pivotes: el del soporte (bajo la placa) y el de la T (eje del esquí); la pata va de uno a otro
pivot_top = [leg_y_top, -plate_t - 6];
pivot_bot = [skid_y, skid_z];
leg_dy = pivot_bot[0] - pivot_top[0];
leg_dz = pivot_top[1] - pivot_bot[1];
leg_tilt = atan(leg_dy / leg_dz);               // inclinación hacia afuera (en torno a x)
leg_in_top = 4;                                 // el tubo termina 4 mm antes del pivote del soporte
leg_in_bot = 10;                                // y 10 mm después del eje del esquí
leg_len = sqrt(leg_dy * leg_dy + leg_dz * leg_dz) - leg_in_top - leg_in_bot;
gear_mount_bolts = [for (sx = [-1, 1], sy = [-1, 1], d = [[-14, -10], [14, -10], [-14, 10], [14, 10]]) [sx * leg_x + d[0], sy * leg_y_top + d[1]]];

motor_d = motor_iface == "L" ? 62 : 38;
motor_h = motor_iface == "L" ? 36 : 26;
function block_bolts() = [for (x = [-block_len + 7, -block_len / 2, -7], y = [-1, 1]) [x, y * (block_w / 2 - 4.5)]];
// main file
// DS-D · bandeja de batería sobre la placa superior (impresa PA12-CF). Batería 12S5P transversal (220 mm en y),
// 2 correas con hebilla de leva + topes; 4.7 kg: los topes evitan que se corra en frenadas (5 g de diseño).
// Local: apoyo sobre la placa en z = 0; centrada en battery_pos.
include <ds_d_frame.scad>
tray_t = 3;
module battery_tray() {
    bw = battery_dims[1]; bl = battery_dims[0];
    difference() {
        union() {
            crbox([bw + 14, bl + 14, tray_t], 5);
            for (y = [-1, 1]) translate([-(bw + 14) / 2, y * (bl / 2 + 3.5) - 3.5, 0]) cube([bw + 14, 5, tray_t + 14]);
        }
        for (p = battery_tray_bolts) translate([p[0] - battery_pos[0], p[1], -1]) cylinder(d = M3, h = tray_t + 2);
        for (y = [-1, 1]) translate([-5, y * 55 - 13, -1]) cube([10, 26, tray_t + 2]);      // correas
        for (x = [-1, 1], y = [-1, 1]) translate([x * bw / 4.5, y * bl / 4, -1]) cylinder(d = 40, h = tray_t + 2);
    }
}
battery_tray();
